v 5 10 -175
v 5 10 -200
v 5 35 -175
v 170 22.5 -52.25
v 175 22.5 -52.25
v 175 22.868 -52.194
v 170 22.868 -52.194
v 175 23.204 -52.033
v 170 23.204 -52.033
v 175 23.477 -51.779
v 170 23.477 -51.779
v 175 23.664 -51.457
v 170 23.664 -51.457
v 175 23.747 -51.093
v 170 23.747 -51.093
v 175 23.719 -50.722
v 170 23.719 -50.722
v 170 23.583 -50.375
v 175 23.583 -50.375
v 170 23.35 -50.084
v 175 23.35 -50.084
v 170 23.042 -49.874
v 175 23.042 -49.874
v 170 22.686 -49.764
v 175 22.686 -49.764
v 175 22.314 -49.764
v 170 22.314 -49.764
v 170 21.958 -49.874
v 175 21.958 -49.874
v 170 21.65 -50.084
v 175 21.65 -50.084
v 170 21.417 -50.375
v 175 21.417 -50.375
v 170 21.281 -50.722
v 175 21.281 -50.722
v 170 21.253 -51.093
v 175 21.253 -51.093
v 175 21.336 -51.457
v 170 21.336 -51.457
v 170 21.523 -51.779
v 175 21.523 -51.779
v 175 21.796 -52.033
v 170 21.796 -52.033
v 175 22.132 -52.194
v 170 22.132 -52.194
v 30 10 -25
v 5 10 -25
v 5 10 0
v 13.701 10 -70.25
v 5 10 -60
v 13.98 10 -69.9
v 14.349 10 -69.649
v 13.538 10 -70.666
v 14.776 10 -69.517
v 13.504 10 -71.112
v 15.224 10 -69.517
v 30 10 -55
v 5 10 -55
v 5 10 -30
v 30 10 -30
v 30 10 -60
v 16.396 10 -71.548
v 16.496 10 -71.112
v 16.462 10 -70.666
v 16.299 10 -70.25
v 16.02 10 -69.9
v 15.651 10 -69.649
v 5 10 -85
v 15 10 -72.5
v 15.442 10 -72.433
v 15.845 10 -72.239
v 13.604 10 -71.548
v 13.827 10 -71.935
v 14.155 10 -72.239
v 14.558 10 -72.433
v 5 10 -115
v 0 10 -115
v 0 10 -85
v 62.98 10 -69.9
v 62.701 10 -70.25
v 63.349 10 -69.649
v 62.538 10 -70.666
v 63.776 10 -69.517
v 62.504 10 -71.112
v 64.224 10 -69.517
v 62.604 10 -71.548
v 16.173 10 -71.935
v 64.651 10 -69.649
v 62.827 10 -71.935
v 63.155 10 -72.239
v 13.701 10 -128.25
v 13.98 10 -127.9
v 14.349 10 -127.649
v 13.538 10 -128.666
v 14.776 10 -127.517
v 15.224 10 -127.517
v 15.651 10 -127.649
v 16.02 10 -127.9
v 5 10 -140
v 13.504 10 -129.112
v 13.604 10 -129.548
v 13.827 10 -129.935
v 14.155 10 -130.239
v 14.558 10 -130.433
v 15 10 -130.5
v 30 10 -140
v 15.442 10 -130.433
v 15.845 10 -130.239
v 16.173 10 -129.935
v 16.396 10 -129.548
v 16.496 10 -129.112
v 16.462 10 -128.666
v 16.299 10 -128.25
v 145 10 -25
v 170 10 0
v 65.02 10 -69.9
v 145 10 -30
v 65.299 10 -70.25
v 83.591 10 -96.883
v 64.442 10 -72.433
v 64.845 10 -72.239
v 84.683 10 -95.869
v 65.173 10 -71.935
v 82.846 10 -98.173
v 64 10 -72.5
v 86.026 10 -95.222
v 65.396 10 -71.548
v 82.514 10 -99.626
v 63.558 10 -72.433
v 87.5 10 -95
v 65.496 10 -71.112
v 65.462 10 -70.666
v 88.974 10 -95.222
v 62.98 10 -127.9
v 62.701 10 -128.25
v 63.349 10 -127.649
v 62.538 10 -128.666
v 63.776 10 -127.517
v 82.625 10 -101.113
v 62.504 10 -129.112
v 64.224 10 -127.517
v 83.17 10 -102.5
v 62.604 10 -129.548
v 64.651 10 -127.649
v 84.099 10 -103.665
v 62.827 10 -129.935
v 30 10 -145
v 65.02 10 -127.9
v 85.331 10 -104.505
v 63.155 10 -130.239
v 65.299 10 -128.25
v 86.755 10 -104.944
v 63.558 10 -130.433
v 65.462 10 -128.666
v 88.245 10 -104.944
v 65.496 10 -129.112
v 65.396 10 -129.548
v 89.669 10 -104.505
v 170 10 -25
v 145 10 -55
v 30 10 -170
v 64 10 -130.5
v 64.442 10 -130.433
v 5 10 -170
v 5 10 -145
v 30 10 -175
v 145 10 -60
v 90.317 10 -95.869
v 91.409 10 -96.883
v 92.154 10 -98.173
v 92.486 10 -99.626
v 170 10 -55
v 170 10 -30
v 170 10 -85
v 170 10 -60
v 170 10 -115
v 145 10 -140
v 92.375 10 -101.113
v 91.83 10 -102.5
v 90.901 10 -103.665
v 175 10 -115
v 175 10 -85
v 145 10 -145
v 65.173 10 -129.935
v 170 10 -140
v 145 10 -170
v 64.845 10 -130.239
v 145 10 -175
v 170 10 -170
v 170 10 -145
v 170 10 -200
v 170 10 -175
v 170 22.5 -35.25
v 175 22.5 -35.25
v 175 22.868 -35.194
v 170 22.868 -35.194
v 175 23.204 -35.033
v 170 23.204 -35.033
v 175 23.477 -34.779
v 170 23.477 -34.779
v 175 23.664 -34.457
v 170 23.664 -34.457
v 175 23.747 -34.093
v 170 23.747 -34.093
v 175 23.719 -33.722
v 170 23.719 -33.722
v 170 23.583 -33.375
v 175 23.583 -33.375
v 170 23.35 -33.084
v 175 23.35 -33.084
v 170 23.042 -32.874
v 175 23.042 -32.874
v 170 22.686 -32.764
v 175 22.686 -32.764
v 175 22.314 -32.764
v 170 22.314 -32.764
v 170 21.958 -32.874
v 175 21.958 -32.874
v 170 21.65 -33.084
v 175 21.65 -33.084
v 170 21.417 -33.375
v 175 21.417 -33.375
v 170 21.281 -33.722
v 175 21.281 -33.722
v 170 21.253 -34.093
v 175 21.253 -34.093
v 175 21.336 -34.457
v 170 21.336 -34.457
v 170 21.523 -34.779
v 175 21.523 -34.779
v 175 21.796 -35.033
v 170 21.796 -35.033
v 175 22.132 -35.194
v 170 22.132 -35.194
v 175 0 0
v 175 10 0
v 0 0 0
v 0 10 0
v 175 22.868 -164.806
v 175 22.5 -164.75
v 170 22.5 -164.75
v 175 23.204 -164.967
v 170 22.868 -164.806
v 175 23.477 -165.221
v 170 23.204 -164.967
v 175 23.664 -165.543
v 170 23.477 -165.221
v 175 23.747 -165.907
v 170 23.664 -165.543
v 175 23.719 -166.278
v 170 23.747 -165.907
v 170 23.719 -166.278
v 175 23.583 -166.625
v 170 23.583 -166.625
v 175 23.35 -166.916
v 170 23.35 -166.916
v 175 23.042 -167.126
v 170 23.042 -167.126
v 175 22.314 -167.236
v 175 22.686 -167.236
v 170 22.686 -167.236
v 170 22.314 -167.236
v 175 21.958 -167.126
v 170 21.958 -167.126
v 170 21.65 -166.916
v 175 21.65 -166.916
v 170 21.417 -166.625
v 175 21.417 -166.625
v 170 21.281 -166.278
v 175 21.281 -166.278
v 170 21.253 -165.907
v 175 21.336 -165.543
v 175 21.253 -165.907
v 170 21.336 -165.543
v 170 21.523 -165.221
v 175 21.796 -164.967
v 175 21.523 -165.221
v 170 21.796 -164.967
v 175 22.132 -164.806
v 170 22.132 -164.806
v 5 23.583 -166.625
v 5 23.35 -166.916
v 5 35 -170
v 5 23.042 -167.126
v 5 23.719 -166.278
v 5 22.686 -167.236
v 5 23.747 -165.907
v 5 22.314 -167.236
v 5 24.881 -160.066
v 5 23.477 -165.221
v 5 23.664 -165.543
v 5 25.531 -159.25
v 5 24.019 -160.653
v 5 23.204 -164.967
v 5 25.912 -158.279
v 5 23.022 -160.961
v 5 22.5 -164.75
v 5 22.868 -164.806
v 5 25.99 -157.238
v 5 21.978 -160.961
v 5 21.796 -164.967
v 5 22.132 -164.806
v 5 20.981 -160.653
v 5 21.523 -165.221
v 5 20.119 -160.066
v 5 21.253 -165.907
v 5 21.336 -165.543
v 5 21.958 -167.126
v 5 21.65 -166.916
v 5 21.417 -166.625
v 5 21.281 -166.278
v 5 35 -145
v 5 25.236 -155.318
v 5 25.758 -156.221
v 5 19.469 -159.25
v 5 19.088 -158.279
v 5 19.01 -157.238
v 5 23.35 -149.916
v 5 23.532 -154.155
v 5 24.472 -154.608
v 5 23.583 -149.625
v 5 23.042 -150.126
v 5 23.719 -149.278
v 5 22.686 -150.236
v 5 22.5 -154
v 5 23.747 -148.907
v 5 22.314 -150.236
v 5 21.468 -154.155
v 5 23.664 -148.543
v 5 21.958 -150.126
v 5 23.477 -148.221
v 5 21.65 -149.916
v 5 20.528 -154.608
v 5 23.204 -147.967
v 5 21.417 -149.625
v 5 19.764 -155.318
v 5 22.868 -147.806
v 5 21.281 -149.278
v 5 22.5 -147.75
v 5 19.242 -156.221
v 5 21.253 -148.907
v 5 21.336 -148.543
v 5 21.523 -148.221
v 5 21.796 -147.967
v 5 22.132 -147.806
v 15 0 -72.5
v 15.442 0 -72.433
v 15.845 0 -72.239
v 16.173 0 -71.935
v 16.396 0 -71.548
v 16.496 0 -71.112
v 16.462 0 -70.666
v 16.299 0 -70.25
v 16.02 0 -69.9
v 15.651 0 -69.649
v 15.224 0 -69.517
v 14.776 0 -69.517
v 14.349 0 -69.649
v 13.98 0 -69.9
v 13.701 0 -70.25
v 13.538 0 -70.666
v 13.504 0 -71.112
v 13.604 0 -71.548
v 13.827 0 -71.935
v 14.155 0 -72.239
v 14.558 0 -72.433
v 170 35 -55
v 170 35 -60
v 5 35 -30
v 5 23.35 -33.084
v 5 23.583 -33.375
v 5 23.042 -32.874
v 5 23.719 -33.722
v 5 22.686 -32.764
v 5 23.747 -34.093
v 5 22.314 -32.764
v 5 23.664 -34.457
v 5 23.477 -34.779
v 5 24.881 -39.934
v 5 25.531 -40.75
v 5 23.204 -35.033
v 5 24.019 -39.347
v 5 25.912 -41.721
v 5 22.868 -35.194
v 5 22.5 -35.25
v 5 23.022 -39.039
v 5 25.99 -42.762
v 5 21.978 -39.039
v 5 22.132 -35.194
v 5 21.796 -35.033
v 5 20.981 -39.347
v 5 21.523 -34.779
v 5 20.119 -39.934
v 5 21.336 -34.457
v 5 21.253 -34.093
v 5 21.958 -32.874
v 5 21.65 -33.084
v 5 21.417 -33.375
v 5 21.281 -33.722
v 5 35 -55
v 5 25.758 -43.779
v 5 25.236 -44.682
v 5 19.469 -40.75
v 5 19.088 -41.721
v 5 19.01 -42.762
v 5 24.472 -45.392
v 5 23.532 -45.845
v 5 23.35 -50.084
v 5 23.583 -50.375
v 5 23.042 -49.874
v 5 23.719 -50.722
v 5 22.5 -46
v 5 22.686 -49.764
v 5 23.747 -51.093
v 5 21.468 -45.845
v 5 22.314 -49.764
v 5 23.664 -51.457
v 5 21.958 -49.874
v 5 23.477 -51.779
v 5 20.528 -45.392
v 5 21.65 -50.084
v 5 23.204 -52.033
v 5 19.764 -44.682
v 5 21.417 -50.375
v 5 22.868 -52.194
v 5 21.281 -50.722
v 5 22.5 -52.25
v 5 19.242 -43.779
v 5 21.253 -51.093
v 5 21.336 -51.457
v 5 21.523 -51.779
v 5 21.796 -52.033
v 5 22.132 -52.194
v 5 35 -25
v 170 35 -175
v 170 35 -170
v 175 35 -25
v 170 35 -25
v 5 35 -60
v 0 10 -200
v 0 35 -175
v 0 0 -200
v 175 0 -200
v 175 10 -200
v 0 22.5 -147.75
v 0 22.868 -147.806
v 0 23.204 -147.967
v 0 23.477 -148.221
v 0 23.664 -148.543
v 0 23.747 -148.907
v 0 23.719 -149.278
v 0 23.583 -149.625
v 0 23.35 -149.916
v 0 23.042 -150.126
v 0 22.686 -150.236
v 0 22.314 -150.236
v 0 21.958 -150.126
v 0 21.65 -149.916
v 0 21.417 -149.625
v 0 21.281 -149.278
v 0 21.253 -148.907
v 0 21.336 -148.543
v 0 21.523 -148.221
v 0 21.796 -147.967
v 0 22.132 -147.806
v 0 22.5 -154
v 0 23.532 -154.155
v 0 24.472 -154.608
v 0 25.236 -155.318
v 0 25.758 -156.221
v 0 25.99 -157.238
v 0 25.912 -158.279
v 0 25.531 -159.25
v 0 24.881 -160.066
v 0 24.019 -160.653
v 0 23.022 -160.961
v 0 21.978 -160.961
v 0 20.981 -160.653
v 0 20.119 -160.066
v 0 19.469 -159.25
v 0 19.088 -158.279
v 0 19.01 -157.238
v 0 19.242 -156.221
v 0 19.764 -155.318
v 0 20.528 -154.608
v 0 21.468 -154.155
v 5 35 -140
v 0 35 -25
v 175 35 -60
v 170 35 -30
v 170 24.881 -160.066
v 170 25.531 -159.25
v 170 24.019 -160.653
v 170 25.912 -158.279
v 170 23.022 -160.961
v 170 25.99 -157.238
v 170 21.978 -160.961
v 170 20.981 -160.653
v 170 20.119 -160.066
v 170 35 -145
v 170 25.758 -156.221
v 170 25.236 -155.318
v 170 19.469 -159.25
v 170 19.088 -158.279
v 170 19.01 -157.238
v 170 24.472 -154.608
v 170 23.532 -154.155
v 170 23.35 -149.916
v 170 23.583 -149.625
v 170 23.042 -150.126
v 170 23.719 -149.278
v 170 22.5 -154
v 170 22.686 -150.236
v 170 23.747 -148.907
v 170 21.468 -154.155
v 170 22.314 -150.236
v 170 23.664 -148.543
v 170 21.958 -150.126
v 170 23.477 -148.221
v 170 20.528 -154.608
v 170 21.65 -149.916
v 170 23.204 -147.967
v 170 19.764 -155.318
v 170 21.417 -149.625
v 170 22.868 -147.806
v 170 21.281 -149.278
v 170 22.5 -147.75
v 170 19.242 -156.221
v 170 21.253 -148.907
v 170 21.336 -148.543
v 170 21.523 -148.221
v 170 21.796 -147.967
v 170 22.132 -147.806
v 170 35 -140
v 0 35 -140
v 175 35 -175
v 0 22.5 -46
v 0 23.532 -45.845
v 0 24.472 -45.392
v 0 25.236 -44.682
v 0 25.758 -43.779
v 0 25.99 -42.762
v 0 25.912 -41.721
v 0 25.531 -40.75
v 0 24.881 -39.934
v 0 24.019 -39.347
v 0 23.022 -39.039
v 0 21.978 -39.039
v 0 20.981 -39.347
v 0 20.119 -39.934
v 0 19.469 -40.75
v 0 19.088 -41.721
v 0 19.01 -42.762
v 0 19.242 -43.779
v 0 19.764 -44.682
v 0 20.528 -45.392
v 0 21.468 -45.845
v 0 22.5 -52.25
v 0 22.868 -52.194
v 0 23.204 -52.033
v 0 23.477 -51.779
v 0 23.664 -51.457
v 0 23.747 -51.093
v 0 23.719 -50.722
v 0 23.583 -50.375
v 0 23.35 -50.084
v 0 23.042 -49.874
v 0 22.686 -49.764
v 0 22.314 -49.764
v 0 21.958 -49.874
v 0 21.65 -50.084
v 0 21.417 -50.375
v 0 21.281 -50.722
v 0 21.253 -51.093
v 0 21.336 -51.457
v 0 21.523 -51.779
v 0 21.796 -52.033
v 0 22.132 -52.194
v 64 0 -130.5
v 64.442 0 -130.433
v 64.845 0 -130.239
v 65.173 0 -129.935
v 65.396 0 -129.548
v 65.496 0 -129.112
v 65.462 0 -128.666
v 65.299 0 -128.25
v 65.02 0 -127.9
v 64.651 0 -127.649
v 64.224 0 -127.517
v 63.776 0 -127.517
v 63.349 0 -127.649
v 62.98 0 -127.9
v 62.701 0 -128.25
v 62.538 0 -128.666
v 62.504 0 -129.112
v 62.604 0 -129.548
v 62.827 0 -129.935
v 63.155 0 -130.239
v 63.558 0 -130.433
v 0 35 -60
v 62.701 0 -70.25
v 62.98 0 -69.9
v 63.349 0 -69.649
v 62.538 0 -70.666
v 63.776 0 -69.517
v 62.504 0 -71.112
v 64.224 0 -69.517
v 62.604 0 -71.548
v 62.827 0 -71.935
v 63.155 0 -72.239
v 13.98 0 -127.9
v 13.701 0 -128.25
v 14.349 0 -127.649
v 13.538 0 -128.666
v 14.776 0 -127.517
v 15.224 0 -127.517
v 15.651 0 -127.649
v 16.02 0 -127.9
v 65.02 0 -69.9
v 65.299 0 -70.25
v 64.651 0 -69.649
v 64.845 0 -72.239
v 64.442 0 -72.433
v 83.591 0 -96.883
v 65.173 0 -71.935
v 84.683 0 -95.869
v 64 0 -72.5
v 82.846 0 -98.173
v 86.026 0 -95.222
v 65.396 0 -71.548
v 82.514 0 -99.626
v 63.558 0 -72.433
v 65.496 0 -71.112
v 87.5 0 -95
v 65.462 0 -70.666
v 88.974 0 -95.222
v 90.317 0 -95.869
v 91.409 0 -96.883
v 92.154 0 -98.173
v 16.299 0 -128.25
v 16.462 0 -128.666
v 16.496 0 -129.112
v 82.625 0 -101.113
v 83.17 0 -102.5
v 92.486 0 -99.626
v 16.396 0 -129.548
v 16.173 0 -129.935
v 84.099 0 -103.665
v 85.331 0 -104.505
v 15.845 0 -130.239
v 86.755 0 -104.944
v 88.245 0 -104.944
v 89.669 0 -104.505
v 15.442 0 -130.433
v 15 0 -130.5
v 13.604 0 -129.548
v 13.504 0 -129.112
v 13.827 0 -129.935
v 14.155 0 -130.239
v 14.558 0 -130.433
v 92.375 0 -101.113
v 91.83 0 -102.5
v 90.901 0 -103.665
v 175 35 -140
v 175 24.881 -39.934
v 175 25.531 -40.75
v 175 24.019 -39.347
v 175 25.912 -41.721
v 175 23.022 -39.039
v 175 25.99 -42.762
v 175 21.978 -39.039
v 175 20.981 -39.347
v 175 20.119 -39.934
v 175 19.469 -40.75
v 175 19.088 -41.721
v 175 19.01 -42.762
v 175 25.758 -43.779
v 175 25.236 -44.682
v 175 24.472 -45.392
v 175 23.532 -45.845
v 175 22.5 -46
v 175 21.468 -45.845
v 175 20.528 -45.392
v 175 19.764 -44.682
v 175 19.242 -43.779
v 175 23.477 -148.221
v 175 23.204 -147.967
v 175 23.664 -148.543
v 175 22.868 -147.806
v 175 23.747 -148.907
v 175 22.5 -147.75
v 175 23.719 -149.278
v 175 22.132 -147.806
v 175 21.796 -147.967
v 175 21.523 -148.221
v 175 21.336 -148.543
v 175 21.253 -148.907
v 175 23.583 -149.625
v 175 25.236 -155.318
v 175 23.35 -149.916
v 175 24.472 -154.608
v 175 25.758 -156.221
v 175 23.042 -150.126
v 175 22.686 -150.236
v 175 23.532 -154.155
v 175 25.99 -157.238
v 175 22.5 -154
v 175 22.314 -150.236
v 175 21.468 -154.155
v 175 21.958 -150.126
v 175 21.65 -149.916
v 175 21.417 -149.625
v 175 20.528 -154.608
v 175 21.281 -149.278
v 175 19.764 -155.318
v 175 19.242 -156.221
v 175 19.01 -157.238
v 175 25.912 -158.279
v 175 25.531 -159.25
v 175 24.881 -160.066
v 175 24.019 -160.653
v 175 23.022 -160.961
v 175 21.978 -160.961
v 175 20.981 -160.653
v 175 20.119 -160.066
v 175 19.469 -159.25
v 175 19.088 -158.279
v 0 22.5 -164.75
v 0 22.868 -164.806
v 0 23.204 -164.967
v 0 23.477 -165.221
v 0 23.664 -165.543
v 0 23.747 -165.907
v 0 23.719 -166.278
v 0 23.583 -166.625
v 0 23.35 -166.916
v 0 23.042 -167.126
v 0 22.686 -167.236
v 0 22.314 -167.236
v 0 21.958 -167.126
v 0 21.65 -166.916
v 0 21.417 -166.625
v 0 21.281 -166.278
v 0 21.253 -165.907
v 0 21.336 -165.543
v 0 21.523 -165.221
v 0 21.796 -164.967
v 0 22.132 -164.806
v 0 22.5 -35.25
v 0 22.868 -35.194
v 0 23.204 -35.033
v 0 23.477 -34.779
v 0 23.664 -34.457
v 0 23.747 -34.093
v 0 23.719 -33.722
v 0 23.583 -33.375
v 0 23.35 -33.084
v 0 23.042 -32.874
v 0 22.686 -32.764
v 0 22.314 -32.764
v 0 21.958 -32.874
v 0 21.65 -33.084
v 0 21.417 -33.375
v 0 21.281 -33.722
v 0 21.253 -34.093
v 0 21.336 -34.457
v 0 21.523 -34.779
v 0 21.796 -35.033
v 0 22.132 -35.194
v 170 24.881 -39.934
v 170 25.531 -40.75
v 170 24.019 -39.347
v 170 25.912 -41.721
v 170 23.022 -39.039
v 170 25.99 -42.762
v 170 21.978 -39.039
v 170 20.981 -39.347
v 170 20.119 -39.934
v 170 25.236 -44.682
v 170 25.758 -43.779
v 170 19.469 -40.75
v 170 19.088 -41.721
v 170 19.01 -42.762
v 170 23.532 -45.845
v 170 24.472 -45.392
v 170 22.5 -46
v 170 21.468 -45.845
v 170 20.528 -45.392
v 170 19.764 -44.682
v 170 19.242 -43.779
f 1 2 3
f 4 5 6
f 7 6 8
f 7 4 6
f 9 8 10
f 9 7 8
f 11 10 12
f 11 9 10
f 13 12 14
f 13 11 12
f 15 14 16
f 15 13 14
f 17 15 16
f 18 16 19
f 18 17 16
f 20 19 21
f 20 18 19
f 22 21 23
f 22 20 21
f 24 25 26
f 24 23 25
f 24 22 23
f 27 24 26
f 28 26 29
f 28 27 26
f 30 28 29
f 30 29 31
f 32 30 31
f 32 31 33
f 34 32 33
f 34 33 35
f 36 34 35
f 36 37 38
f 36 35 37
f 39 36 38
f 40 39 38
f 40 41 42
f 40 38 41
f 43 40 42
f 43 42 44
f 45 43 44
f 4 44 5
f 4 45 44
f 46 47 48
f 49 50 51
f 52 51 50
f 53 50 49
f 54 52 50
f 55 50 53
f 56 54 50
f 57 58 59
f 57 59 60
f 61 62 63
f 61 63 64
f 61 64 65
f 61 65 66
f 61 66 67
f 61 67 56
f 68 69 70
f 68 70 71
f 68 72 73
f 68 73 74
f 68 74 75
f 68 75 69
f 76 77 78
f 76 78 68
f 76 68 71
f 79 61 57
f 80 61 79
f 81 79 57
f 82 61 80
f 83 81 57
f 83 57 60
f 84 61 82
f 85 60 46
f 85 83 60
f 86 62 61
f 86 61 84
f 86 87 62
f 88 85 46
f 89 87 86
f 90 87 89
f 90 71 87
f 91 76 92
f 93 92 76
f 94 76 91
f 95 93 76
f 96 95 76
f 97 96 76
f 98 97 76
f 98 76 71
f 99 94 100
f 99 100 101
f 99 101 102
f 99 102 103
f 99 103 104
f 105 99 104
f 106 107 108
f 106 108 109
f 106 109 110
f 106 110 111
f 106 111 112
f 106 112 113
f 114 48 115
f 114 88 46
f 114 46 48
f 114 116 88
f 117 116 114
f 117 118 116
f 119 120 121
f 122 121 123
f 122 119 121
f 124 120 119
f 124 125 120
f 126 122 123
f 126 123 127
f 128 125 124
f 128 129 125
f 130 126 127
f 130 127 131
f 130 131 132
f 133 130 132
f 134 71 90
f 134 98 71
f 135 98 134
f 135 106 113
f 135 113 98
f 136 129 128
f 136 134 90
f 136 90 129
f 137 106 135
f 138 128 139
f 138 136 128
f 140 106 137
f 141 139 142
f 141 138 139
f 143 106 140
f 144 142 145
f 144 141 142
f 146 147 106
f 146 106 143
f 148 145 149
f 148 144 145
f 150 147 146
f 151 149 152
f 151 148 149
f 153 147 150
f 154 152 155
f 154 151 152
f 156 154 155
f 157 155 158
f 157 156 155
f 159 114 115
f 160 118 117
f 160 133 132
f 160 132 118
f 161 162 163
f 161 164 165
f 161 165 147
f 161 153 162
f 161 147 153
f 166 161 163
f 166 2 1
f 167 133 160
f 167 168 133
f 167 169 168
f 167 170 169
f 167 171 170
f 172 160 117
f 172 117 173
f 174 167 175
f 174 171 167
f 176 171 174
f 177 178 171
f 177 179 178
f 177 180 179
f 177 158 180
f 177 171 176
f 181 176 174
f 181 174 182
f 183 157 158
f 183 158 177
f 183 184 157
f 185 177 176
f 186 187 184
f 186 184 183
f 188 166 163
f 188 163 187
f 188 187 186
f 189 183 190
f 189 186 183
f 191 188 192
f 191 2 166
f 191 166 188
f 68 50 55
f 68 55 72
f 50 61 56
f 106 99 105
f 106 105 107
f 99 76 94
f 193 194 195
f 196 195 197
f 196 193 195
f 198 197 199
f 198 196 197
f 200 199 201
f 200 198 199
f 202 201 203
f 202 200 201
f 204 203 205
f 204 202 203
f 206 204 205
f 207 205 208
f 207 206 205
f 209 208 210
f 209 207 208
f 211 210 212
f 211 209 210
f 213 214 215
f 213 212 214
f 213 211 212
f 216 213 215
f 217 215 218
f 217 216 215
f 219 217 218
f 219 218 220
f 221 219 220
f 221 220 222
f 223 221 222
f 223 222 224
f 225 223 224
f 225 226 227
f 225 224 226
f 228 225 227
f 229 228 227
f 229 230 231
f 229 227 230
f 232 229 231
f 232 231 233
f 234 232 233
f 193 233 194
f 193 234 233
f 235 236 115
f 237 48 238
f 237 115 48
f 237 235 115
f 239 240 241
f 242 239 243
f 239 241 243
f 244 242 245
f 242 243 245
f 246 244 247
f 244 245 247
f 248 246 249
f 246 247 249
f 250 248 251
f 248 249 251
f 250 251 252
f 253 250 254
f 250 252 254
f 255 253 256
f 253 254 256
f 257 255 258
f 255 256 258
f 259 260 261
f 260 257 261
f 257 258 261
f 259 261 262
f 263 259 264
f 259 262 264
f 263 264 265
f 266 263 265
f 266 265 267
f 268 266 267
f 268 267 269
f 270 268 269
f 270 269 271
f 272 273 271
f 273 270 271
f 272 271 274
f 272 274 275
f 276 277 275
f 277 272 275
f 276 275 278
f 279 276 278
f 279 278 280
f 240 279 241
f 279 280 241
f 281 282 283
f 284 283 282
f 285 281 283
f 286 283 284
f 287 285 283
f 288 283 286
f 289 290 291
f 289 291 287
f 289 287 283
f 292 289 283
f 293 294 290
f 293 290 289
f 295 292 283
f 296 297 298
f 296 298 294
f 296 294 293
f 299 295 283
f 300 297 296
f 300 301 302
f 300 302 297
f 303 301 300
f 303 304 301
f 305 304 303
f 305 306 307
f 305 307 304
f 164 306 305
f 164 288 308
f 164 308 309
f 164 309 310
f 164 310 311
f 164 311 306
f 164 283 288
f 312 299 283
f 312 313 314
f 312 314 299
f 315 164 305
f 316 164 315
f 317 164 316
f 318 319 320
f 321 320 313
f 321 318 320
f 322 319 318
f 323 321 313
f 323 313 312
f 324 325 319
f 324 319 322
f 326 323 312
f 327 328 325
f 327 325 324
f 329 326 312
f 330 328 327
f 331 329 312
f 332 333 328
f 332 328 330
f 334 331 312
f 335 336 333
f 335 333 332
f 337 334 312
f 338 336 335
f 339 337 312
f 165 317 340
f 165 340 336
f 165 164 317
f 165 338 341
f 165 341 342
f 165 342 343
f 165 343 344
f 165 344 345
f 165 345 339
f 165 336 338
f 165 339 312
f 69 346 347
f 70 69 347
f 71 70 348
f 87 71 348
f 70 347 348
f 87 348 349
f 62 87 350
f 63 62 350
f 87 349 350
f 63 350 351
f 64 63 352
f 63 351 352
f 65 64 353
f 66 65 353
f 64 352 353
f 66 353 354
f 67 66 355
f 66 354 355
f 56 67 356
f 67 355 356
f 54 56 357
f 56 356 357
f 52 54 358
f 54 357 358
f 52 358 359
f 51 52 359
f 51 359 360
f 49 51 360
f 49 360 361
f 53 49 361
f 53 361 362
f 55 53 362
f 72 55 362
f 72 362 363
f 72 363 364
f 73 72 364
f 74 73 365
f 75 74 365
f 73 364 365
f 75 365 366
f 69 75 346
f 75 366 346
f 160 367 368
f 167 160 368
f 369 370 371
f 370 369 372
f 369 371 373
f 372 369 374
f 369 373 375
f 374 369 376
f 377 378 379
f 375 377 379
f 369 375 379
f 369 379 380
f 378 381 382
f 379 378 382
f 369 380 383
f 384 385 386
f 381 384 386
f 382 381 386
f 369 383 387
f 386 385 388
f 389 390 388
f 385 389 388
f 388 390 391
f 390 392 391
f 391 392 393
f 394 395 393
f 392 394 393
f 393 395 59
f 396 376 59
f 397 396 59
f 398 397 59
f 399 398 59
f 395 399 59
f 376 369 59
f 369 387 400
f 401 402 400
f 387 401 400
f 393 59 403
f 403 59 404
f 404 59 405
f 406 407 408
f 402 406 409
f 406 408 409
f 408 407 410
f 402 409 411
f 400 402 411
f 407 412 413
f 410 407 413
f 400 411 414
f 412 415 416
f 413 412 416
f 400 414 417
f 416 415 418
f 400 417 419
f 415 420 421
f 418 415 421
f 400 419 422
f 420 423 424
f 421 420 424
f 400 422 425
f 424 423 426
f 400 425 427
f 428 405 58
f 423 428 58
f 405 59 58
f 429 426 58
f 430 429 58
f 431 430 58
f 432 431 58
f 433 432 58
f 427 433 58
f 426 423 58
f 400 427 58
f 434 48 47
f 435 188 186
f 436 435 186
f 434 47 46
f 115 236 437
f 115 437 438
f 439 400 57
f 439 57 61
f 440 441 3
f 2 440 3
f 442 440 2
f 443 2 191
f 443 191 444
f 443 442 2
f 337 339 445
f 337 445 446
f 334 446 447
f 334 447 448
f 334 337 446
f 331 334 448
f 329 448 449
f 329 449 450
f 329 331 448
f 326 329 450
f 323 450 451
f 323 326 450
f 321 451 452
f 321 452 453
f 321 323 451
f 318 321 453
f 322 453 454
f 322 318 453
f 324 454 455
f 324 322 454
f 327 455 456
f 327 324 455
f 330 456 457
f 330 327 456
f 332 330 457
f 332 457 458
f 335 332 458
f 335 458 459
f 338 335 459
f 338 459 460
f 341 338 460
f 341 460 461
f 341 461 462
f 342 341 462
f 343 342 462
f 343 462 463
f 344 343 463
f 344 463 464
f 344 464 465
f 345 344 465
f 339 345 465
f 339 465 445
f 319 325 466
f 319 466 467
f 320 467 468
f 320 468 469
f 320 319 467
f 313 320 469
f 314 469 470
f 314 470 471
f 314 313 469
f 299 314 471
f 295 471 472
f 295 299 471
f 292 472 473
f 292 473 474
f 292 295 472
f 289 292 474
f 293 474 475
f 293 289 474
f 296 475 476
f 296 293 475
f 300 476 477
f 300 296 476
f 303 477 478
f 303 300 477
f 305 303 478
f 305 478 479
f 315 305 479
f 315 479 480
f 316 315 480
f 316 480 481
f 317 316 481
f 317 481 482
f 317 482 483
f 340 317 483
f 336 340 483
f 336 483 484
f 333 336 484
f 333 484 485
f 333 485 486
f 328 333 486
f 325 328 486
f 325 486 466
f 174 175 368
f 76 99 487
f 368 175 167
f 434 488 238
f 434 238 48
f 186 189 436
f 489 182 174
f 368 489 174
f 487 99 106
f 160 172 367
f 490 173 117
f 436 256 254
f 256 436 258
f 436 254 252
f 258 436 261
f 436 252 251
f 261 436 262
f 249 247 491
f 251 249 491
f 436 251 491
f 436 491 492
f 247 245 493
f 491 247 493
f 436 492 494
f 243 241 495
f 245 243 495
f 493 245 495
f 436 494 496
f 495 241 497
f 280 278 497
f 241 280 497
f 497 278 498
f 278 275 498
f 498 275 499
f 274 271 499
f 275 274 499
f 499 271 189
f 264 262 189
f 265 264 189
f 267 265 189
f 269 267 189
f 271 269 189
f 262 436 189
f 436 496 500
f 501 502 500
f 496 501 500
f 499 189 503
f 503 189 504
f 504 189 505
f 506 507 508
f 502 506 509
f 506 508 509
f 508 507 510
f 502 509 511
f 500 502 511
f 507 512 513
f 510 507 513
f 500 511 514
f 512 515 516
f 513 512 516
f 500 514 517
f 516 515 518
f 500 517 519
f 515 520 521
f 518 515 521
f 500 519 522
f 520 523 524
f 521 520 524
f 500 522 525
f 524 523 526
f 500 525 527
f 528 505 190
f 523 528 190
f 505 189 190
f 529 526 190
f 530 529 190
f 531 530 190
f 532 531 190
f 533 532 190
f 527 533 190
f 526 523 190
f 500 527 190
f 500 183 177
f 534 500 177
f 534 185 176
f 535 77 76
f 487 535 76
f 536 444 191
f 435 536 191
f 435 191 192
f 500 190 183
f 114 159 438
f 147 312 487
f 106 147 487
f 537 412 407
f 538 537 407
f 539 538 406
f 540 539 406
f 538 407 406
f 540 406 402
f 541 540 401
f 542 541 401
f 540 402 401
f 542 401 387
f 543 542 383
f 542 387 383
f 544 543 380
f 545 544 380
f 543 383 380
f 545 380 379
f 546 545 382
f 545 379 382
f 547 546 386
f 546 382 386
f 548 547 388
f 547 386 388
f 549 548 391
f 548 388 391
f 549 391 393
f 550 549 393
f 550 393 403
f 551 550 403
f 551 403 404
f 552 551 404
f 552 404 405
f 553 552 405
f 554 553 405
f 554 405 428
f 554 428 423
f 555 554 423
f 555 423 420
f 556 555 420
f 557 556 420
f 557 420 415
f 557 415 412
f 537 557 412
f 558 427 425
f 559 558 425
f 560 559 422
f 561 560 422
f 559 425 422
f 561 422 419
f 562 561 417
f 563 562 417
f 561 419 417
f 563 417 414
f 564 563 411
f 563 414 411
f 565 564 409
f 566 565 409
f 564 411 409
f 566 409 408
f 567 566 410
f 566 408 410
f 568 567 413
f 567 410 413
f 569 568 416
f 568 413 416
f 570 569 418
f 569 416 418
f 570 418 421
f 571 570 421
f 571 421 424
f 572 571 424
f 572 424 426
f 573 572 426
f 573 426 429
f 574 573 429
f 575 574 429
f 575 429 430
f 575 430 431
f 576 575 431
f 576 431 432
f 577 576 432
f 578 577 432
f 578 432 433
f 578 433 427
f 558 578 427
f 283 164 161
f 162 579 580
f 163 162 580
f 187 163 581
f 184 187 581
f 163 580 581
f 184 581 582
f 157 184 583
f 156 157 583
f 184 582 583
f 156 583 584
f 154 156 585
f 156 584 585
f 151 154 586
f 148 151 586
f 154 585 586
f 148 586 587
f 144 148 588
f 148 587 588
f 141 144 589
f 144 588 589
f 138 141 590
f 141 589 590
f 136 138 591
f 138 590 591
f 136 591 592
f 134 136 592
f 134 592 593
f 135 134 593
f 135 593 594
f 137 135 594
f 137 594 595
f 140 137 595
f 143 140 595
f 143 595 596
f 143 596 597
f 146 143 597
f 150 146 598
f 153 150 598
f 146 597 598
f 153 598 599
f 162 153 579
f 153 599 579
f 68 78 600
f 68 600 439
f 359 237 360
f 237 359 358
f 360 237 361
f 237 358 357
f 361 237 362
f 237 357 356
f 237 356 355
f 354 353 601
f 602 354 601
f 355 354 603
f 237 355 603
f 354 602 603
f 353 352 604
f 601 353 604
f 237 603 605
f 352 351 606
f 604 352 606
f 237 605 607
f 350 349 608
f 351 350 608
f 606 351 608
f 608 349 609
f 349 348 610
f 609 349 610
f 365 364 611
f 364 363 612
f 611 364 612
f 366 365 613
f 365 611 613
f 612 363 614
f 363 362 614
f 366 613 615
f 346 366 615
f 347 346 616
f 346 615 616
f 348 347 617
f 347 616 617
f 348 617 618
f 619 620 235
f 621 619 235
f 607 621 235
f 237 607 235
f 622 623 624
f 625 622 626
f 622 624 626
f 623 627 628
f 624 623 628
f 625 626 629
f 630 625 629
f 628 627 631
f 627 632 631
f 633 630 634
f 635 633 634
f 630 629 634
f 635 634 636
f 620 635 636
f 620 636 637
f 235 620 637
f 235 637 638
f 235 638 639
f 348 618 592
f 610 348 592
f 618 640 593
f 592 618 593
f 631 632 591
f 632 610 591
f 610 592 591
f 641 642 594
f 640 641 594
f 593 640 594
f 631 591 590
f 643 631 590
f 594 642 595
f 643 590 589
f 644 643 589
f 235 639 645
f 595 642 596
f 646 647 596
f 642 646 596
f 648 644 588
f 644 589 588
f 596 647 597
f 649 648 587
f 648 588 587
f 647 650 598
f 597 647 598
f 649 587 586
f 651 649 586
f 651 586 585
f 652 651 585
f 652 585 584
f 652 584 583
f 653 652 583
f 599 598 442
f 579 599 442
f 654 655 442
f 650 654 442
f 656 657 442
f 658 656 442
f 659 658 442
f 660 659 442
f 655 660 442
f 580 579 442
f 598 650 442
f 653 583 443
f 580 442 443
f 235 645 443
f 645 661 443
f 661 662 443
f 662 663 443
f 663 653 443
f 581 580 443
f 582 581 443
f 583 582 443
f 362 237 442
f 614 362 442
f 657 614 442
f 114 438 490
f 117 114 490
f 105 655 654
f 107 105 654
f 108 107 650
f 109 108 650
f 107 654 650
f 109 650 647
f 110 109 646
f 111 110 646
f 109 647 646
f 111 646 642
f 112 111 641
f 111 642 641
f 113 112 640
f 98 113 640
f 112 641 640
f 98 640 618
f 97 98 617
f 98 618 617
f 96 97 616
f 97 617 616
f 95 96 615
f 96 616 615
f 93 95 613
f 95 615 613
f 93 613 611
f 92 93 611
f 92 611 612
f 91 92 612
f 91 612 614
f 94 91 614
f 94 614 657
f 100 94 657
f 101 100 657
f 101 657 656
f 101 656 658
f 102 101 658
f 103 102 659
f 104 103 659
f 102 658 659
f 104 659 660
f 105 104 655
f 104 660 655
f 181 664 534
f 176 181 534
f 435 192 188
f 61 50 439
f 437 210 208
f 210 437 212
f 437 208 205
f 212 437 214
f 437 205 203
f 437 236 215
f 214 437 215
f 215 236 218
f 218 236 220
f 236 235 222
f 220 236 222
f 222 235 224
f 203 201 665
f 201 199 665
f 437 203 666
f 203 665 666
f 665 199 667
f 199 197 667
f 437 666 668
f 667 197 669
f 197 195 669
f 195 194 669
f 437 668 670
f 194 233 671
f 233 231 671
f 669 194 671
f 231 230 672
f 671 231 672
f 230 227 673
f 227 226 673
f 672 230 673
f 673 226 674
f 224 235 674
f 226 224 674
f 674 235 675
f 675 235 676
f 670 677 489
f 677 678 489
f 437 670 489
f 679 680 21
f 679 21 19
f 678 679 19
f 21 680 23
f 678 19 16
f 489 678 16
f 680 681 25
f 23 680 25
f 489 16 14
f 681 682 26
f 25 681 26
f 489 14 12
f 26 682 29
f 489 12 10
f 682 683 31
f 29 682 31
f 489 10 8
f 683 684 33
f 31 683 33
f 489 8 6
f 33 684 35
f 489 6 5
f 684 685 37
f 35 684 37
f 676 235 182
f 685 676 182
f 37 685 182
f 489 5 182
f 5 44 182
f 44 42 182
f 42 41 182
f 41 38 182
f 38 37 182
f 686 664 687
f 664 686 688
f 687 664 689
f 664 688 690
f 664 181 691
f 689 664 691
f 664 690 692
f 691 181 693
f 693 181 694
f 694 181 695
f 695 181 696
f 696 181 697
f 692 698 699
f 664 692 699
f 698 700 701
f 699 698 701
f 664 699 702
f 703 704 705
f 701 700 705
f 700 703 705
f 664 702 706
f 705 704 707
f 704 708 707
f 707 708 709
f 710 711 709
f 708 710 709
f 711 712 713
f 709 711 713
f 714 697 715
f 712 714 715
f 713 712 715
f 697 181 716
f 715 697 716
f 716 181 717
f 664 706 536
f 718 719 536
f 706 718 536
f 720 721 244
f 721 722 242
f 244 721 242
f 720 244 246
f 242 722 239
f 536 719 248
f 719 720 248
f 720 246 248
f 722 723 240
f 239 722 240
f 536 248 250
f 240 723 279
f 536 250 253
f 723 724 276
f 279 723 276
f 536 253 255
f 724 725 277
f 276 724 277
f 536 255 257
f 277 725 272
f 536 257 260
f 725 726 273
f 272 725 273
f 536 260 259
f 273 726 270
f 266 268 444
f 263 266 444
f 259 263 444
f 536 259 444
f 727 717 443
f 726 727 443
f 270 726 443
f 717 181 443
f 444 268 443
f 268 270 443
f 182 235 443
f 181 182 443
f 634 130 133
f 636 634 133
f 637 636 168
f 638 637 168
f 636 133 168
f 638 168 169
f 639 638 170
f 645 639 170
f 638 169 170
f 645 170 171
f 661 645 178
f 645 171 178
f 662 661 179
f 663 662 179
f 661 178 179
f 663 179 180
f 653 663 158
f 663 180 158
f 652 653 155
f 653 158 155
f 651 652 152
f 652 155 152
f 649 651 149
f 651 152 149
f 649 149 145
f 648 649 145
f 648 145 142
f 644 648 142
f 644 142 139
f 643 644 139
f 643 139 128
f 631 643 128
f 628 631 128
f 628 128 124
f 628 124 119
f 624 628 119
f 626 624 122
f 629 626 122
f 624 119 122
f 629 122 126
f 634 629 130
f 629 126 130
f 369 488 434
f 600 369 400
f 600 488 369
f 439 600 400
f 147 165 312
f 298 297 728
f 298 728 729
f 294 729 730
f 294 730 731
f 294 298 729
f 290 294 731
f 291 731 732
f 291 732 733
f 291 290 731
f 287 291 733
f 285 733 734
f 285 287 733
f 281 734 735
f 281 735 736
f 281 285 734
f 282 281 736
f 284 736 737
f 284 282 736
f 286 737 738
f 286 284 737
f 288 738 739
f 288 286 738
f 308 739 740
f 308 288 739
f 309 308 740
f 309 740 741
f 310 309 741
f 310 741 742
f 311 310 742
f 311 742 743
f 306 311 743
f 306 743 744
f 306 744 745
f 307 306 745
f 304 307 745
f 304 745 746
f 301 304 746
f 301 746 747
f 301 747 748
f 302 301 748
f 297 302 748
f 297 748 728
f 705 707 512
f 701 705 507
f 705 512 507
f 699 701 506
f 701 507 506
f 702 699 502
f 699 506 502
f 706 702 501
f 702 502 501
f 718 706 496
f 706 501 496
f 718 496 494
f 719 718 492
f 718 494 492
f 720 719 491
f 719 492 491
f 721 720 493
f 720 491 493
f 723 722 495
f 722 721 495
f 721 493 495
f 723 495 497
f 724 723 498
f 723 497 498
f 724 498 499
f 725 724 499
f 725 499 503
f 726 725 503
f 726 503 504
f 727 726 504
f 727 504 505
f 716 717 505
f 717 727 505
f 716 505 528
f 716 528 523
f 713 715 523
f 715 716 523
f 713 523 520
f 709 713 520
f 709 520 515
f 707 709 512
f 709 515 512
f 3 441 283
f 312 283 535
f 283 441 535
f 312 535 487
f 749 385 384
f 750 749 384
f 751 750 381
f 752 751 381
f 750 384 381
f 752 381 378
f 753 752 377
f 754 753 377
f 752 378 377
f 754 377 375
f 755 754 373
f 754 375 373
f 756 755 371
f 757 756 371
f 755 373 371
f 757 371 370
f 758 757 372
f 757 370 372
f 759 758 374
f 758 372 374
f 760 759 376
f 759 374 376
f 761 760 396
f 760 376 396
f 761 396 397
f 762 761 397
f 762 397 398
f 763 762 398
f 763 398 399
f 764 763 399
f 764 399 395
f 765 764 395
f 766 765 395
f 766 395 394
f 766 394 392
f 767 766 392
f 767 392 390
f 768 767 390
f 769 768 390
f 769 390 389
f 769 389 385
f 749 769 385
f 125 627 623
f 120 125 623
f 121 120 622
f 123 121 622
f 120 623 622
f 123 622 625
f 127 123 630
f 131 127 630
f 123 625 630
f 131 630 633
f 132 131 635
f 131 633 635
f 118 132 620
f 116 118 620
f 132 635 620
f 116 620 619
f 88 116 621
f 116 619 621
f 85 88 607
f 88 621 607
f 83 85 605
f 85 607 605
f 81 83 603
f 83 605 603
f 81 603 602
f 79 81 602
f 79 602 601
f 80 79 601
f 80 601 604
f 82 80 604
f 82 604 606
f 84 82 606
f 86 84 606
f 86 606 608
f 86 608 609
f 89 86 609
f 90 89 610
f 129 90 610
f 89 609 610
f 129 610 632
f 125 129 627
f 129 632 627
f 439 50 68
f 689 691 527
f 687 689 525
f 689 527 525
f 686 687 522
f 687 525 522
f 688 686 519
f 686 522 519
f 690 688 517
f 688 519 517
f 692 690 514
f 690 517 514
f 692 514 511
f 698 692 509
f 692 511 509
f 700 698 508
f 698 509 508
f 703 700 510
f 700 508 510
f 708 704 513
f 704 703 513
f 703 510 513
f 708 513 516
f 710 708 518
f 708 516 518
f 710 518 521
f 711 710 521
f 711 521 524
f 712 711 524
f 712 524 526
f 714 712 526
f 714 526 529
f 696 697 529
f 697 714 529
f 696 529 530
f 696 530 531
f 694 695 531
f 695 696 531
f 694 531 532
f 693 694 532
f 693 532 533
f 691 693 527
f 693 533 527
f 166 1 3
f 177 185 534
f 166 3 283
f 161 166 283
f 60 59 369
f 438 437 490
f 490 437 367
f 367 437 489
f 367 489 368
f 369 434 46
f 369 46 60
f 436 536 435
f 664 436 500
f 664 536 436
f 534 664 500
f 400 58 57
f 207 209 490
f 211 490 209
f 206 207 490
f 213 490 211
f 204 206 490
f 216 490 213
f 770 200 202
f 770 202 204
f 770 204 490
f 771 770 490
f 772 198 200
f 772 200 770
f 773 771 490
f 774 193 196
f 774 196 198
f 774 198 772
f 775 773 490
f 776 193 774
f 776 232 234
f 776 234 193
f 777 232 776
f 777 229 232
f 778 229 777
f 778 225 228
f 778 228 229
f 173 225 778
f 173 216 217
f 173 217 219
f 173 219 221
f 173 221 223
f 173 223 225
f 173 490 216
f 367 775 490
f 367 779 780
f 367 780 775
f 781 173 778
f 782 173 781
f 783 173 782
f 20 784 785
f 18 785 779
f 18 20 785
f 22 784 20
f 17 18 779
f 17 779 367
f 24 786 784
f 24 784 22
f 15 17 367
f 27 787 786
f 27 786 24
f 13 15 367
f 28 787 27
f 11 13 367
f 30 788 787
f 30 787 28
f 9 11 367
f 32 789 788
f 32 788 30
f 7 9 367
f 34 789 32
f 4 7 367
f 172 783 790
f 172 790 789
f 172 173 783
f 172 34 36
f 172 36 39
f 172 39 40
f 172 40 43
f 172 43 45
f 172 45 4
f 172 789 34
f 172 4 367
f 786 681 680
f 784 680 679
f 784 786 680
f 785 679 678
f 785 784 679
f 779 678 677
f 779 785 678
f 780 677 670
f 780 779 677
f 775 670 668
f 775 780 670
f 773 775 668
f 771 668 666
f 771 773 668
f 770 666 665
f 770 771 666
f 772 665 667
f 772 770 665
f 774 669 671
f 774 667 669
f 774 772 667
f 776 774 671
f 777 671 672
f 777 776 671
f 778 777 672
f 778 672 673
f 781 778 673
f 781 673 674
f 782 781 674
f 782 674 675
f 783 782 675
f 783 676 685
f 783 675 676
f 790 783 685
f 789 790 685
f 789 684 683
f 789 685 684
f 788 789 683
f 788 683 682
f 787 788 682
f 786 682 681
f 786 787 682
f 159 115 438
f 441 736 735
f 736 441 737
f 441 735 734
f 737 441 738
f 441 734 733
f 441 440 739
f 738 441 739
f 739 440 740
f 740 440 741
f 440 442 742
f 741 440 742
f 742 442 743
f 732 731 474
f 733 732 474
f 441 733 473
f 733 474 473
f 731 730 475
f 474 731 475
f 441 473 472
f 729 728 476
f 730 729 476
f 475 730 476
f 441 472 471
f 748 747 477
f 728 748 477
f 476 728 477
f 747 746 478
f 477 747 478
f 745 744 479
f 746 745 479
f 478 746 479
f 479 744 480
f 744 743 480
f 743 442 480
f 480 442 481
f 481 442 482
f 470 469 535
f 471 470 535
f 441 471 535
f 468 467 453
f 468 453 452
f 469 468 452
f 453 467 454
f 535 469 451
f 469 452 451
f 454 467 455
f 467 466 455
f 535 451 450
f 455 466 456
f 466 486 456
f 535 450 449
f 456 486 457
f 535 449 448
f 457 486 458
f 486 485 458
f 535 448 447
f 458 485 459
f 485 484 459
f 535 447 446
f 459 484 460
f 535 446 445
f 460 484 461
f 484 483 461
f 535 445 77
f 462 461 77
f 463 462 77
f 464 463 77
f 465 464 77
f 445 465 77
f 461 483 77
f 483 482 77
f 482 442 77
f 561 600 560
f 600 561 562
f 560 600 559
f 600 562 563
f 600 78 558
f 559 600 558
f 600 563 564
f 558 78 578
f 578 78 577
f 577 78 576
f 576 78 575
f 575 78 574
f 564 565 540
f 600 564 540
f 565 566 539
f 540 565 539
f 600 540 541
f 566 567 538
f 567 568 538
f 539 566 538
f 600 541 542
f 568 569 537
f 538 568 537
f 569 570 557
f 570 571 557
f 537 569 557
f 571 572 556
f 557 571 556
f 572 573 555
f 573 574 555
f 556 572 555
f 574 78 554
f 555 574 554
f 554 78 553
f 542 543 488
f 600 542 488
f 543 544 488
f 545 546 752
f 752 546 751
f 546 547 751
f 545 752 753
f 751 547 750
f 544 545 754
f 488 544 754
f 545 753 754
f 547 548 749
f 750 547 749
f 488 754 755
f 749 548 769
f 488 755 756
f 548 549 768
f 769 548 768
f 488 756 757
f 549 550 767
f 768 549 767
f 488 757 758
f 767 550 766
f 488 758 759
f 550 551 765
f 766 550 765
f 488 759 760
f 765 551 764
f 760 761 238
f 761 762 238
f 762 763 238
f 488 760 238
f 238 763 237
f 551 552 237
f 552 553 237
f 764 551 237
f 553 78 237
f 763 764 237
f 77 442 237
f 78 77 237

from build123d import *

# Parameters (mm, degrees)
SKETCH1_W                = 175
SKETCH1_H                = 200
BOSS_EXTRUDE1_DEPTH      = 10
SKETCH3_W                = 5
SKETCH3_H                = 25
SKETCH3_W_2              = 25
SKETCH3_H_2              = 5
BOSS_EXTRUDE2_DEPTH      = 25
CHAMFER1_SIZE            = 25
SKETCH4_R                = 3.5
SKETCH4_R_2              = 1.25
CUT_EXTRUDE1_DEPTH       = 25
CHAMFER1_OF_MIRROR1_SIZE = 25
SKETCH5_R                = 5
CUT_EXTRUDE2_DEPTH       = 10
SKETCH6_R                = 1.5
CUT_EXTRUDE3_DEPTH       = 10


# Read off the part's stored shape, not the designer's step: Mirror2
with BuildPart() as part:
    # Sketch1 → Boss-Extrude1 (new body)
    with BuildSketch(Plane(origin=(0, 0, 0), x_dir=(1, 0, 0), z_dir=(0, 1, 0))):
        with Locations((87.5, 100)):
            Rectangle(SKETCH1_W, SKETCH1_H)
    extrude(amount=BOSS_EXTRUDE1_DEPTH)

    # Sketch3 → Boss-Extrude2 (add)
    with BuildSketch(Plane(origin=(0, 10, 0), x_dir=(1, 0, 0), z_dir=(0, 1, 0))):
        with Locations((2.5, 72.5)):
            Rectangle(SKETCH3_W, SKETCH3_H)
        Polygon((0, 60), (0, 25), (5, 25), (5, 30), (5, 55), (5, 60), align=None)
        with Locations((17.5, 57.5)):
            Rectangle(SKETCH3_W_2, SKETCH3_H_2)
        with Locations((17.5, 27.5)):
            Rectangle(SKETCH3_W_2, SKETCH3_H_2)
        with Locations((2.5, 12.5)):
            Rectangle(SKETCH3_W, SKETCH3_H)
    boss_extrude2 = extrude(amount=BOSS_EXTRUDE2_DEPTH)

    # Chamfer1
    chamfer1_edges = [part.edges().sort_by_distance(p)[0] for p in [
        (2.5, 35, -85),
        (30, 35, -57.5),
        (30, 35, -27.5),
        (2.5, 35, 0),
    ]]
    chamfer(chamfer1_edges, length=CHAMFER1_SIZE - 0.0001)  # a hair under: the kernel refuses the full size

    # Sketch4 → Cut-Extrude1 (cut)
    with BuildSketch(Plane(origin=(5, 0, 0), x_dir=(0, 0, -1), z_dir=(1, 0, 0))):
        with Locations((42.5, 22.5)):
            Circle(SKETCH4_R)
        with Locations((34, 22.5)):
            Circle(SKETCH4_R_2)
        with Locations((51, 22.5)):
            Circle(SKETCH4_R_2)
    cut_extrude1 = extrude(amount=-CUT_EXTRUDE1_DEPTH, mode=Mode.SUBTRACT)

    # Mirror1: Boss-Extrude2, Cut-Extrude1 across plane
    add(boss_extrude2.mirror(Plane(origin=(87.5, 0, 0), x_dir=(0, 0, 1), z_dir=(1, 0, 0))))
    add(cut_extrude1.mirror(Plane(origin=(87.5, 0, 0), x_dir=(0, 0, 1), z_dir=(1, 0, 0))), mode=Mode.SUBTRACT)

    # Chamfer1 of Mirror1
    chamfer1_of_mirror1_edges = [part.edges().sort_by_distance(p)[0] for p in [
        (172.5, 35, -85),
        (145, 35, -57.5),
        (145, 35, -27.5),
        (172.5, 35, 0),
    ]]
    chamfer(chamfer1_of_mirror1_edges, length=CHAMFER1_OF_MIRROR1_SIZE - 0.0001)  # a hair under: the kernel refuses the full size

    # Mirror2: part across plane


with BuildPart() as part_1:
    add(part.part)
    add(part.part.mirror(Plane.XY.offset(-100)))

    # Sketch5 → Cut-Extrude2 (cut)
    with BuildSketch(Plane(origin=(0, 10, 0), x_dir=(1, 0, 0), z_dir=(0, 1, 0))):
        with Locations(Location((87.5, 100, 0), (0, 0, 270))):
            Circle(SKETCH5_R)
    extrude(amount=-CUT_EXTRUDE2_DEPTH, mode=Mode.SUBTRACT)

    # Sketch6 → Cut-Extrude3 (cut)
    with BuildSketch(Plane.XZ):
        with Locations(Location((15, -71, 0), (0, 0, 270))):
            Circle(SKETCH6_R)
        with Locations(Location((64, -71, 0), (0, 0, 270))):
            Circle(SKETCH6_R)
        with Locations(Location((15, -129, 0), (0, 0, 270))):
            Circle(SKETCH6_R)
        with Locations(Location((64, -129, 0), (0, 0, 270))):
            Circle(SKETCH6_R)
    extrude(amount=-CUT_EXTRUDE3_DEPTH, mode=Mode.SUBTRACT)


solid = part_1.part
